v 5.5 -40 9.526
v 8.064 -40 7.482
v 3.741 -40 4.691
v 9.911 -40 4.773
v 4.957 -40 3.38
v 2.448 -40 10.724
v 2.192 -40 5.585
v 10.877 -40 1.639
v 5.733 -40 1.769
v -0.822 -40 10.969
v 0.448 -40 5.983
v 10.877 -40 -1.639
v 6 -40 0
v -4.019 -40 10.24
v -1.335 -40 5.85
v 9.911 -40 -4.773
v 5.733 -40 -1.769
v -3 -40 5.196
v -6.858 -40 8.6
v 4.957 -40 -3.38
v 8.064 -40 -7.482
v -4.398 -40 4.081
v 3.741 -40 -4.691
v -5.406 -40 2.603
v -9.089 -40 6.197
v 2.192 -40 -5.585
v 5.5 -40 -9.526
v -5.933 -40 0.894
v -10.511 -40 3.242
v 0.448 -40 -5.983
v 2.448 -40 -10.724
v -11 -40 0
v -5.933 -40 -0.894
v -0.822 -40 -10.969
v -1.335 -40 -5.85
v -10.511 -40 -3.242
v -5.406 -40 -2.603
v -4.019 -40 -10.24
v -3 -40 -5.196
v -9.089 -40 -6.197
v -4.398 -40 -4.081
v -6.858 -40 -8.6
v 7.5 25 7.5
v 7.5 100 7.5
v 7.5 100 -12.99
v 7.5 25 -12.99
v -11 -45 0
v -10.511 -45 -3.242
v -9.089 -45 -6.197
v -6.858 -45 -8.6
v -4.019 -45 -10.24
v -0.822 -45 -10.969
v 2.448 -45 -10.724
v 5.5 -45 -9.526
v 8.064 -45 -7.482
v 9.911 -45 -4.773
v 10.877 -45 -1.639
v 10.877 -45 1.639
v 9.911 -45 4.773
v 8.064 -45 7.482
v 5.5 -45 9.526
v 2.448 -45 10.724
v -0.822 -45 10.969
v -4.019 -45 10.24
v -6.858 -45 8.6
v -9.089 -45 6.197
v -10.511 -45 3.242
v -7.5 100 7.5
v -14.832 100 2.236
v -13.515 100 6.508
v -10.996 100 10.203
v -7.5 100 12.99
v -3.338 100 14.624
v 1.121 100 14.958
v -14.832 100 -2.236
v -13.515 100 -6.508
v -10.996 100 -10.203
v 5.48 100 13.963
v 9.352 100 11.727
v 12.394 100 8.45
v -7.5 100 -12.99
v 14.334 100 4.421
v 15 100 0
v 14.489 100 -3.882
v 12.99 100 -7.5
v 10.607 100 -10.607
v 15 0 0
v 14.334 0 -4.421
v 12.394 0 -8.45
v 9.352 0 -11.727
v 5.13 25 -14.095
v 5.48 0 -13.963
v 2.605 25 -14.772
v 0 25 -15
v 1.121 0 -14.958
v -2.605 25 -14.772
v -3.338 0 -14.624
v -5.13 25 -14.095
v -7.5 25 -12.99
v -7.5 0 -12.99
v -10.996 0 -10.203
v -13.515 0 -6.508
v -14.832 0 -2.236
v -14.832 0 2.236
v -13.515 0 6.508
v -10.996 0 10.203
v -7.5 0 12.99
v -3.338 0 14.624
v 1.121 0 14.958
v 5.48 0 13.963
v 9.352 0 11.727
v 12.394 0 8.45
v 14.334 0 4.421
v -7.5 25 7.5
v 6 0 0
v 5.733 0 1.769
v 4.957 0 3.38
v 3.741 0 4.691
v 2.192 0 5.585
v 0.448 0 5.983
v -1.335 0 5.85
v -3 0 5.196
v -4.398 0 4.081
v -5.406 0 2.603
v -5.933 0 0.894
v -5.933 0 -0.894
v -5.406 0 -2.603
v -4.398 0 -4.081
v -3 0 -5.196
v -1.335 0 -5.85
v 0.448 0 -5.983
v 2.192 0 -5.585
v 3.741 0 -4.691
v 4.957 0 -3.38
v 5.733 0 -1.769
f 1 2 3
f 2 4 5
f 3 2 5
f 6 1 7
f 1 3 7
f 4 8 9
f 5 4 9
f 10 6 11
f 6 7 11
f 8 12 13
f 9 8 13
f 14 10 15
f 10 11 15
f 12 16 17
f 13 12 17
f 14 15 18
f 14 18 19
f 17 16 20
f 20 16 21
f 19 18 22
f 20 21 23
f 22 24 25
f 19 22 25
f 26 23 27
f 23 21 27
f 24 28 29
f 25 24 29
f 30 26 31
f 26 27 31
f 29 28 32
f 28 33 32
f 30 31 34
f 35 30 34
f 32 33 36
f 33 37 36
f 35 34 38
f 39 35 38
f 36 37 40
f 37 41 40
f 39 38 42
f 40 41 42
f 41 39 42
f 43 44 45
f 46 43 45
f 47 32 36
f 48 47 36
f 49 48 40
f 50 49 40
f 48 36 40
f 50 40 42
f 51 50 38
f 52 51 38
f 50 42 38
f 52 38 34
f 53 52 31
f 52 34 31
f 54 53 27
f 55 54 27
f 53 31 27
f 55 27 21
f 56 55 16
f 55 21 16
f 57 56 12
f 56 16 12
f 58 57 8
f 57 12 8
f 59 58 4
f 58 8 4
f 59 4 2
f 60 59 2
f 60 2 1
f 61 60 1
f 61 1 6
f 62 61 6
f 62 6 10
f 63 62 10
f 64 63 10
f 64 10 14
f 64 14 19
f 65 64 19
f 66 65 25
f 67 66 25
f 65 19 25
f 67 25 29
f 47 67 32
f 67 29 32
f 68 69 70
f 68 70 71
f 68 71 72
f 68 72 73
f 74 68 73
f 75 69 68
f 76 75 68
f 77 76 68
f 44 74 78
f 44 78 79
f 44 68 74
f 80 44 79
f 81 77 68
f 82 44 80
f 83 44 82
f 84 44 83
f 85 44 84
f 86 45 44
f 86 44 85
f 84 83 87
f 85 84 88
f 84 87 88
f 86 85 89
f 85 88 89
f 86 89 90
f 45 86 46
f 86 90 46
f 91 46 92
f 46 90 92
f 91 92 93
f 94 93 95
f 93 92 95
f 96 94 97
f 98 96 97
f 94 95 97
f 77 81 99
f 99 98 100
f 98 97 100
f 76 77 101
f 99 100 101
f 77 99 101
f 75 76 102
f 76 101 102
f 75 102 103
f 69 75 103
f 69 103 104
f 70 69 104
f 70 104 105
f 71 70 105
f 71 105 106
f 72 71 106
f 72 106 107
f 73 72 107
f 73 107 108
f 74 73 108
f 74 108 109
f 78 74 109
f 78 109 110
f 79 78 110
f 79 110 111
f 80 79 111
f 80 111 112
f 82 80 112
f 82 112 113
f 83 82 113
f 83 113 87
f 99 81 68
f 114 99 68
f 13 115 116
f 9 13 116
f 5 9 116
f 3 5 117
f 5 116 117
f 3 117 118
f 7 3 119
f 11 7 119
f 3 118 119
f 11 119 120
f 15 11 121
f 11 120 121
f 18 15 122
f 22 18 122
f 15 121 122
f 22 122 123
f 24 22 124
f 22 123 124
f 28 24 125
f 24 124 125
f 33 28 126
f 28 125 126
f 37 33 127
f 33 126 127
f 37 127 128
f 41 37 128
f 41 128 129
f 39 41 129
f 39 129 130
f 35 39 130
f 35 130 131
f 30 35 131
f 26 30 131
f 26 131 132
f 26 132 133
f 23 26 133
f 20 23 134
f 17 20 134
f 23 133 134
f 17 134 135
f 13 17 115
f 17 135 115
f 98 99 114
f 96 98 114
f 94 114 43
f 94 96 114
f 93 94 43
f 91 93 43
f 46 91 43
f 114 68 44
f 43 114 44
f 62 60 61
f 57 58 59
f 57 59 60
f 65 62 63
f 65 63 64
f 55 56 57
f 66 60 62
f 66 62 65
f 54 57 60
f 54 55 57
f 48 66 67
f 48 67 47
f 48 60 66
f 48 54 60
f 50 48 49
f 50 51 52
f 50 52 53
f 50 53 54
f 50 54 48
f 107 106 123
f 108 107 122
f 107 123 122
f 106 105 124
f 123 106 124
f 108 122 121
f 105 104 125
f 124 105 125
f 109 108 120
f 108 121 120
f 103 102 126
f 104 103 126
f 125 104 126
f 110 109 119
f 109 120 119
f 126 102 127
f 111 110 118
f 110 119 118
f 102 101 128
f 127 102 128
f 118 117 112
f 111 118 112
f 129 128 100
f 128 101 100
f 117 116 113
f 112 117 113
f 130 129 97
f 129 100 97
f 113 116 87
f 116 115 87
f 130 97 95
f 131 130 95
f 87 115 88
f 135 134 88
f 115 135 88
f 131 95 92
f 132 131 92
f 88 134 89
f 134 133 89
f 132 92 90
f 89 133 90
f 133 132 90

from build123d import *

# Parameters (mm, degrees)
SKETCH1_R           = 15
BOSS_EXTRUDE1_DEPTH = 100
SKETCH3_W           = 15
SKETCH3_H           = 15
CUT_EXTRUDE2_DEPTH  = 75
SKETCH2_R           = 6
BOSS_EXTRUDE2_DEPTH = 40
SKETCH4_R           = 11
BOSS_EXTRUDE3_DEPTH = 5


with BuildPart() as part:
    # Sketch1 → Boss-Extrude1 (new body)
    with BuildSketch(Plane(origin=(0, 0, 0), x_dir=(1, 0, 0), z_dir=(0, 1, 0))):
        Circle(SKETCH1_R)
    extrude(amount=BOSS_EXTRUDE1_DEPTH)

    # Sketch3 → Cut-Extrude2 (cut)
    with BuildSketch(Plane(origin=(0, 100, 0), x_dir=(1, 0, 0), z_dir=(0, 1, 0))):
        Rectangle(SKETCH3_W, SKETCH3_H)
        with BuildLine():
            Line((-7.5, 12.990381057), (-7.5, 7.5))
            Line((-7.5, 7.5), (7.5, 7.5))
            Line((7.5, 7.5), (7.5, 12.990381057))
            ThreePointArc((7.5, 12.990381057), (3.882285677, 14.488887394), (0, 15))
            ThreePointArc((0, 15), (-3.882285677, 14.488887394), (-7.5, 12.990381057))
        make_face()
    extrude(amount=-CUT_EXTRUDE2_DEPTH, mode=Mode.SUBTRACT)

    # Sketch2 → Boss-Extrude2 (add)
    with BuildSketch(Plane.XZ):
        Circle(SKETCH2_R)
    extrude(amount=BOSS_EXTRUDE2_DEPTH)

    # Sketch4 → Boss-Extrude3 (add)
    with BuildSketch(Plane(origin=(0, -40, 0), x_dir=(-1, 0, 0), z_dir=(0, -1, 0))):
        Circle(SKETCH4_R)
    extrude(amount=BOSS_EXTRUDE3_DEPTH)


solid = part.part
